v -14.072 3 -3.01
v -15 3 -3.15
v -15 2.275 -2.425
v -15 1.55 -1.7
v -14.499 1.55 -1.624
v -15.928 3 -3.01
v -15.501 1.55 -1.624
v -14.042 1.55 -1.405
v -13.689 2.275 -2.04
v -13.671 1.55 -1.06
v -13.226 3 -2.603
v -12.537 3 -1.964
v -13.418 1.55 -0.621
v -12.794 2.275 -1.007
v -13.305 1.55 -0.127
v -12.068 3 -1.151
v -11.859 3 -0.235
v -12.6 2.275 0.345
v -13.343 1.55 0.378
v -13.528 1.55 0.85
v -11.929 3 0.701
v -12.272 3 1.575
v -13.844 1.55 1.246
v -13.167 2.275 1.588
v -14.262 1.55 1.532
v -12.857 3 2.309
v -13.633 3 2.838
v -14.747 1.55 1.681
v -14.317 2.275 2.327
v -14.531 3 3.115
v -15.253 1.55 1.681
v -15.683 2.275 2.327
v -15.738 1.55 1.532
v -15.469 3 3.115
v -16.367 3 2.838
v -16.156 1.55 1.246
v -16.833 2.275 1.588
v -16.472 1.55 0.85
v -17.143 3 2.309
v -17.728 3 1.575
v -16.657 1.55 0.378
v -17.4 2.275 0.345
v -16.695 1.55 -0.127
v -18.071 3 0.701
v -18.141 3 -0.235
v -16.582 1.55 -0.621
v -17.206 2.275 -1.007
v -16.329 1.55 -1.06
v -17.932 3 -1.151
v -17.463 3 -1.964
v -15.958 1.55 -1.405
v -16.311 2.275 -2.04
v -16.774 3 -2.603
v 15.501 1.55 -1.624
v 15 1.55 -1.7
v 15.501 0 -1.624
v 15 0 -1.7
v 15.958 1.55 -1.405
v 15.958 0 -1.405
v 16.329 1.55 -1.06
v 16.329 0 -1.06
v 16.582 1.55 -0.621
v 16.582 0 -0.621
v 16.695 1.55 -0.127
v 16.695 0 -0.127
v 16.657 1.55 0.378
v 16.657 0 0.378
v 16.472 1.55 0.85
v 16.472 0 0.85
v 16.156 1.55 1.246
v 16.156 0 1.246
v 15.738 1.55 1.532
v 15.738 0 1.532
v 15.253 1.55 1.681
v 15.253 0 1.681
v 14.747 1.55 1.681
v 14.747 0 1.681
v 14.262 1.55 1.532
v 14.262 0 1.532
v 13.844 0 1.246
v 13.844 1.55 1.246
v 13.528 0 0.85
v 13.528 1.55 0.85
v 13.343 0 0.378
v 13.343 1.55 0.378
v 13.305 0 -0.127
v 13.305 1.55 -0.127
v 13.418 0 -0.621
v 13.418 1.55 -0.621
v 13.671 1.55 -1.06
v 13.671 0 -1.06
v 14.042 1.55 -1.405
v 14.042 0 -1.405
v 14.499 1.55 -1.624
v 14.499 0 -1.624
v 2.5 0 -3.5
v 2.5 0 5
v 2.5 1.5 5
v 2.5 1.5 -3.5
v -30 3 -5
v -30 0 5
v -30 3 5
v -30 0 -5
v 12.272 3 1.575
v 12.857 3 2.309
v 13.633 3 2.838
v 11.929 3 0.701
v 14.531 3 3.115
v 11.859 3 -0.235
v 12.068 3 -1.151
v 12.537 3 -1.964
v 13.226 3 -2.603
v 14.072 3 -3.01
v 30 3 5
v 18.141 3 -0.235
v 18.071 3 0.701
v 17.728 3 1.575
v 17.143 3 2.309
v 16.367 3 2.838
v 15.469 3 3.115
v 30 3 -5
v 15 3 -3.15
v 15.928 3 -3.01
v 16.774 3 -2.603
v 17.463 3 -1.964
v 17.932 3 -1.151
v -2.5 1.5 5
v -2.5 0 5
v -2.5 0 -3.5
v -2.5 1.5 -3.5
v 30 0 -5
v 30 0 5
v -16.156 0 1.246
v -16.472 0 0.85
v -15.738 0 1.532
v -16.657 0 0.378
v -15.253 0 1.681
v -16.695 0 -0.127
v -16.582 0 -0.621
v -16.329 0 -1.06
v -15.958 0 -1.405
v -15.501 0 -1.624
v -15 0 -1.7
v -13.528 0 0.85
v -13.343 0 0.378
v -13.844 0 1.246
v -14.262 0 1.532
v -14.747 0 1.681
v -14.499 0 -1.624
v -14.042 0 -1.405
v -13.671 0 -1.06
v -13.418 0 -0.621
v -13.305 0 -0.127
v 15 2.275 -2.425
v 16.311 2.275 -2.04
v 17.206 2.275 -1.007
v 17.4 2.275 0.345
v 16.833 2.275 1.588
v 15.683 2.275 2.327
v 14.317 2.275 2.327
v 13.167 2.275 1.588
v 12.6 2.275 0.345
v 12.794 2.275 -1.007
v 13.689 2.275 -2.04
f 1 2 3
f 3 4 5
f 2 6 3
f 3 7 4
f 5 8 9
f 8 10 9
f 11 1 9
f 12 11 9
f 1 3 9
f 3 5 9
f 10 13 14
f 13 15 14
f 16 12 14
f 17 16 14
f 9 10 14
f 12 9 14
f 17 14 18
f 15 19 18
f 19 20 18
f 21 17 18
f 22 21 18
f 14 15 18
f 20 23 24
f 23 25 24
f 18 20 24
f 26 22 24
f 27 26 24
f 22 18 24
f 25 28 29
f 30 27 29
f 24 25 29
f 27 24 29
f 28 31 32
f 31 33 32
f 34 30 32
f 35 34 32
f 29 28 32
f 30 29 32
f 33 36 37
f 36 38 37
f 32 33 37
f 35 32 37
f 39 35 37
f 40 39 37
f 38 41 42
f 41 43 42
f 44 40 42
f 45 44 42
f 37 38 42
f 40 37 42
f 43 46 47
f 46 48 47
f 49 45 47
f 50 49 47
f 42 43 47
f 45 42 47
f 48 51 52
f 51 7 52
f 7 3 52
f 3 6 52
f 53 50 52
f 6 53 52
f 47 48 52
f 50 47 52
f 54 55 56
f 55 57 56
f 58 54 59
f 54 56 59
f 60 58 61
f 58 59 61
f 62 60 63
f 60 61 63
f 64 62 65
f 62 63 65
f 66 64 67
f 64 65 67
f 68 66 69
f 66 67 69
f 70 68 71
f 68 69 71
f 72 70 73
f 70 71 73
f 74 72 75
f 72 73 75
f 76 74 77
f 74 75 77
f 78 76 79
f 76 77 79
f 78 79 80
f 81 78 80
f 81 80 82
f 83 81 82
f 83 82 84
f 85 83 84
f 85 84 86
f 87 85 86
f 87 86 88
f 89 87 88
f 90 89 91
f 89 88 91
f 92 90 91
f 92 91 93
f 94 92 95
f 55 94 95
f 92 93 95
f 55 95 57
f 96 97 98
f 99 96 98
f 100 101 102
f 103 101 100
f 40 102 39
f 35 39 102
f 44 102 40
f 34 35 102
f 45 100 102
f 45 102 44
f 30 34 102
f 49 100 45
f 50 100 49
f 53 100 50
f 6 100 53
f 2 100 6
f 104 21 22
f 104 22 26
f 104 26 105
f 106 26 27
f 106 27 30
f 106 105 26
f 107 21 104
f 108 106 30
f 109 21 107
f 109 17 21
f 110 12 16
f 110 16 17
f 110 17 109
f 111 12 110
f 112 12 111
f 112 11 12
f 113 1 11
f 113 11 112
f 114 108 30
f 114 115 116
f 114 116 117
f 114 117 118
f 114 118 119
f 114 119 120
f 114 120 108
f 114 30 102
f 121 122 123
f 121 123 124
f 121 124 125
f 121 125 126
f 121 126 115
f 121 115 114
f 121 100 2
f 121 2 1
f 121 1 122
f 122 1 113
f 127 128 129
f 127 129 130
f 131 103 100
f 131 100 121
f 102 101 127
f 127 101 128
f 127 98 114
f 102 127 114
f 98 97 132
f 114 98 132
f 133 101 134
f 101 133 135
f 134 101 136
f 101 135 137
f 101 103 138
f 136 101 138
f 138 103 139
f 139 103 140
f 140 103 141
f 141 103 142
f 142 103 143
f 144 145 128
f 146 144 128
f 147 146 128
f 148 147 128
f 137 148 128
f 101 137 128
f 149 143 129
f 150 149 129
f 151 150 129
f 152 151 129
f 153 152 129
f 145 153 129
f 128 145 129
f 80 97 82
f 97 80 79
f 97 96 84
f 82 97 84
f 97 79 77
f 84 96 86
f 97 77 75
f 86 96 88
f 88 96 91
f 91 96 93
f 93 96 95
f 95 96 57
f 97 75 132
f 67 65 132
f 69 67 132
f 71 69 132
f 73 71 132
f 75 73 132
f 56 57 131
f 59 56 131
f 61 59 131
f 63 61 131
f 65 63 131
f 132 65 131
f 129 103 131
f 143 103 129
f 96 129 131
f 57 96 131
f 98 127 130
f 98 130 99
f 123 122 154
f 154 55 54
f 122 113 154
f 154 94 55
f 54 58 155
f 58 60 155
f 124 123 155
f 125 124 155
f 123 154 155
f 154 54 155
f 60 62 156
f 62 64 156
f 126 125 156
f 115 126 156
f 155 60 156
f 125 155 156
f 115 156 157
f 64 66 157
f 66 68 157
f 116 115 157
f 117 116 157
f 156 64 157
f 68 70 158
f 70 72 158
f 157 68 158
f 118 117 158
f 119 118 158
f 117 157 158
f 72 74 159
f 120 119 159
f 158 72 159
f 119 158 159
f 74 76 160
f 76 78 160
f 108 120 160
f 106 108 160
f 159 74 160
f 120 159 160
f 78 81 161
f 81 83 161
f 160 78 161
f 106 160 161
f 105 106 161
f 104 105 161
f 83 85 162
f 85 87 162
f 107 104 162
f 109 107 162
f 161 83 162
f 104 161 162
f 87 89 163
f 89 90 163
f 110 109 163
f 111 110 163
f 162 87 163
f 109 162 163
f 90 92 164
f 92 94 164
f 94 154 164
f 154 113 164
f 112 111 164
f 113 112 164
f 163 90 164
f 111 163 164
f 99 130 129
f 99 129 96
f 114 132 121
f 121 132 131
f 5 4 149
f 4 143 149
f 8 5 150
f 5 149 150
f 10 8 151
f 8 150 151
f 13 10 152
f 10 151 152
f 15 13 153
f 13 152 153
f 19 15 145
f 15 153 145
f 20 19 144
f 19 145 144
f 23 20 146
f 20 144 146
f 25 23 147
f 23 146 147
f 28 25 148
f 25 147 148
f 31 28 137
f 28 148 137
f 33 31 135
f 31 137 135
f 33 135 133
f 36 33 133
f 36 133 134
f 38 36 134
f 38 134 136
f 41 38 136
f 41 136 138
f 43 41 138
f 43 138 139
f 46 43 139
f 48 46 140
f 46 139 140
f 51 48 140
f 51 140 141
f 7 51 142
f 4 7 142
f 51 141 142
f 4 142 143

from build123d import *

# Parameters (mm, degrees)
SKETCH1_W                                           = 60
SKETCH1_H                                           = 10
BOSS_EXTRUDE1_DEPTH                                 = 3
CSK_FOR_M3_COUNTERSUNK_FLAT_HEAD_SCREW1_D           = 3.4
CSK_FOR_M3_COUNTERSUNK_FLAT_HEAD_SCREW1_DEPTH       = 7.5
CSK_FOR_M3_COUNTERSUNK_FLAT_HEAD_SCREW1_CSINK_D     = 6.3
CSK_FOR_M3_COUNTERSUNK_FLAT_HEAD_SCREW1_CSINK_ANGLE = 90
CSK_FOR_M3_COUNTERSUNK_FLAT_HEAD_SCREW1_TIP         = 1.021463052
SKETCH4_W                                           = 5
SKETCH4_H                                           = 1.5
CUT_EXTRUDE1_DEPTH                                  = 8.5


with BuildPart() as part:
    # Sketch1 → Boss-Extrude1 (new body)
    with BuildSketch(Plane(origin=(0, 0, 0), x_dir=(1, 0, 0), z_dir=(0, 1, 0))):
        Rectangle(SKETCH1_W, SKETCH1_H)
    extrude(amount=BOSS_EXTRUDE1_DEPTH)

    # CSK for M3 Countersunk Flat Head Screw1
    with Locations(Plane(origin=(-15, 3, 0), x_dir=(0, 0, 1), z_dir=(0, 1, 0))):
        with Locations((0, 0), (0, 30)):
            CounterSinkHole(CSK_FOR_M3_COUNTERSUNK_FLAT_HEAD_SCREW1_D / 2, CSK_FOR_M3_COUNTERSUNK_FLAT_HEAD_SCREW1_CSINK_D / 2, depth=CSK_FOR_M3_COUNTERSUNK_FLAT_HEAD_SCREW1_DEPTH, counter_sink_angle=CSK_FOR_M3_COUNTERSUNK_FLAT_HEAD_SCREW1_CSINK_ANGLE)
            with Locations((0, 0, -(CSK_FOR_M3_COUNTERSUNK_FLAT_HEAD_SCREW1_DEPTH + CSK_FOR_M3_COUNTERSUNK_FLAT_HEAD_SCREW1_TIP / 2))):  # 118° drill point
                Cone(0, CSK_FOR_M3_COUNTERSUNK_FLAT_HEAD_SCREW1_D / 2, CSK_FOR_M3_COUNTERSUNK_FLAT_HEAD_SCREW1_TIP, mode=Mode.SUBTRACT)

    # Sketch4 → Cut-Extrude1 (cut)
    with BuildSketch(Plane.XY.offset(5)):
        with Locations((0, 0.75)):
            Rectangle(SKETCH4_W, SKETCH4_H)
    extrude(amount=-CUT_EXTRUDE1_DEPTH, mode=Mode.SUBTRACT)


solid = part.part
